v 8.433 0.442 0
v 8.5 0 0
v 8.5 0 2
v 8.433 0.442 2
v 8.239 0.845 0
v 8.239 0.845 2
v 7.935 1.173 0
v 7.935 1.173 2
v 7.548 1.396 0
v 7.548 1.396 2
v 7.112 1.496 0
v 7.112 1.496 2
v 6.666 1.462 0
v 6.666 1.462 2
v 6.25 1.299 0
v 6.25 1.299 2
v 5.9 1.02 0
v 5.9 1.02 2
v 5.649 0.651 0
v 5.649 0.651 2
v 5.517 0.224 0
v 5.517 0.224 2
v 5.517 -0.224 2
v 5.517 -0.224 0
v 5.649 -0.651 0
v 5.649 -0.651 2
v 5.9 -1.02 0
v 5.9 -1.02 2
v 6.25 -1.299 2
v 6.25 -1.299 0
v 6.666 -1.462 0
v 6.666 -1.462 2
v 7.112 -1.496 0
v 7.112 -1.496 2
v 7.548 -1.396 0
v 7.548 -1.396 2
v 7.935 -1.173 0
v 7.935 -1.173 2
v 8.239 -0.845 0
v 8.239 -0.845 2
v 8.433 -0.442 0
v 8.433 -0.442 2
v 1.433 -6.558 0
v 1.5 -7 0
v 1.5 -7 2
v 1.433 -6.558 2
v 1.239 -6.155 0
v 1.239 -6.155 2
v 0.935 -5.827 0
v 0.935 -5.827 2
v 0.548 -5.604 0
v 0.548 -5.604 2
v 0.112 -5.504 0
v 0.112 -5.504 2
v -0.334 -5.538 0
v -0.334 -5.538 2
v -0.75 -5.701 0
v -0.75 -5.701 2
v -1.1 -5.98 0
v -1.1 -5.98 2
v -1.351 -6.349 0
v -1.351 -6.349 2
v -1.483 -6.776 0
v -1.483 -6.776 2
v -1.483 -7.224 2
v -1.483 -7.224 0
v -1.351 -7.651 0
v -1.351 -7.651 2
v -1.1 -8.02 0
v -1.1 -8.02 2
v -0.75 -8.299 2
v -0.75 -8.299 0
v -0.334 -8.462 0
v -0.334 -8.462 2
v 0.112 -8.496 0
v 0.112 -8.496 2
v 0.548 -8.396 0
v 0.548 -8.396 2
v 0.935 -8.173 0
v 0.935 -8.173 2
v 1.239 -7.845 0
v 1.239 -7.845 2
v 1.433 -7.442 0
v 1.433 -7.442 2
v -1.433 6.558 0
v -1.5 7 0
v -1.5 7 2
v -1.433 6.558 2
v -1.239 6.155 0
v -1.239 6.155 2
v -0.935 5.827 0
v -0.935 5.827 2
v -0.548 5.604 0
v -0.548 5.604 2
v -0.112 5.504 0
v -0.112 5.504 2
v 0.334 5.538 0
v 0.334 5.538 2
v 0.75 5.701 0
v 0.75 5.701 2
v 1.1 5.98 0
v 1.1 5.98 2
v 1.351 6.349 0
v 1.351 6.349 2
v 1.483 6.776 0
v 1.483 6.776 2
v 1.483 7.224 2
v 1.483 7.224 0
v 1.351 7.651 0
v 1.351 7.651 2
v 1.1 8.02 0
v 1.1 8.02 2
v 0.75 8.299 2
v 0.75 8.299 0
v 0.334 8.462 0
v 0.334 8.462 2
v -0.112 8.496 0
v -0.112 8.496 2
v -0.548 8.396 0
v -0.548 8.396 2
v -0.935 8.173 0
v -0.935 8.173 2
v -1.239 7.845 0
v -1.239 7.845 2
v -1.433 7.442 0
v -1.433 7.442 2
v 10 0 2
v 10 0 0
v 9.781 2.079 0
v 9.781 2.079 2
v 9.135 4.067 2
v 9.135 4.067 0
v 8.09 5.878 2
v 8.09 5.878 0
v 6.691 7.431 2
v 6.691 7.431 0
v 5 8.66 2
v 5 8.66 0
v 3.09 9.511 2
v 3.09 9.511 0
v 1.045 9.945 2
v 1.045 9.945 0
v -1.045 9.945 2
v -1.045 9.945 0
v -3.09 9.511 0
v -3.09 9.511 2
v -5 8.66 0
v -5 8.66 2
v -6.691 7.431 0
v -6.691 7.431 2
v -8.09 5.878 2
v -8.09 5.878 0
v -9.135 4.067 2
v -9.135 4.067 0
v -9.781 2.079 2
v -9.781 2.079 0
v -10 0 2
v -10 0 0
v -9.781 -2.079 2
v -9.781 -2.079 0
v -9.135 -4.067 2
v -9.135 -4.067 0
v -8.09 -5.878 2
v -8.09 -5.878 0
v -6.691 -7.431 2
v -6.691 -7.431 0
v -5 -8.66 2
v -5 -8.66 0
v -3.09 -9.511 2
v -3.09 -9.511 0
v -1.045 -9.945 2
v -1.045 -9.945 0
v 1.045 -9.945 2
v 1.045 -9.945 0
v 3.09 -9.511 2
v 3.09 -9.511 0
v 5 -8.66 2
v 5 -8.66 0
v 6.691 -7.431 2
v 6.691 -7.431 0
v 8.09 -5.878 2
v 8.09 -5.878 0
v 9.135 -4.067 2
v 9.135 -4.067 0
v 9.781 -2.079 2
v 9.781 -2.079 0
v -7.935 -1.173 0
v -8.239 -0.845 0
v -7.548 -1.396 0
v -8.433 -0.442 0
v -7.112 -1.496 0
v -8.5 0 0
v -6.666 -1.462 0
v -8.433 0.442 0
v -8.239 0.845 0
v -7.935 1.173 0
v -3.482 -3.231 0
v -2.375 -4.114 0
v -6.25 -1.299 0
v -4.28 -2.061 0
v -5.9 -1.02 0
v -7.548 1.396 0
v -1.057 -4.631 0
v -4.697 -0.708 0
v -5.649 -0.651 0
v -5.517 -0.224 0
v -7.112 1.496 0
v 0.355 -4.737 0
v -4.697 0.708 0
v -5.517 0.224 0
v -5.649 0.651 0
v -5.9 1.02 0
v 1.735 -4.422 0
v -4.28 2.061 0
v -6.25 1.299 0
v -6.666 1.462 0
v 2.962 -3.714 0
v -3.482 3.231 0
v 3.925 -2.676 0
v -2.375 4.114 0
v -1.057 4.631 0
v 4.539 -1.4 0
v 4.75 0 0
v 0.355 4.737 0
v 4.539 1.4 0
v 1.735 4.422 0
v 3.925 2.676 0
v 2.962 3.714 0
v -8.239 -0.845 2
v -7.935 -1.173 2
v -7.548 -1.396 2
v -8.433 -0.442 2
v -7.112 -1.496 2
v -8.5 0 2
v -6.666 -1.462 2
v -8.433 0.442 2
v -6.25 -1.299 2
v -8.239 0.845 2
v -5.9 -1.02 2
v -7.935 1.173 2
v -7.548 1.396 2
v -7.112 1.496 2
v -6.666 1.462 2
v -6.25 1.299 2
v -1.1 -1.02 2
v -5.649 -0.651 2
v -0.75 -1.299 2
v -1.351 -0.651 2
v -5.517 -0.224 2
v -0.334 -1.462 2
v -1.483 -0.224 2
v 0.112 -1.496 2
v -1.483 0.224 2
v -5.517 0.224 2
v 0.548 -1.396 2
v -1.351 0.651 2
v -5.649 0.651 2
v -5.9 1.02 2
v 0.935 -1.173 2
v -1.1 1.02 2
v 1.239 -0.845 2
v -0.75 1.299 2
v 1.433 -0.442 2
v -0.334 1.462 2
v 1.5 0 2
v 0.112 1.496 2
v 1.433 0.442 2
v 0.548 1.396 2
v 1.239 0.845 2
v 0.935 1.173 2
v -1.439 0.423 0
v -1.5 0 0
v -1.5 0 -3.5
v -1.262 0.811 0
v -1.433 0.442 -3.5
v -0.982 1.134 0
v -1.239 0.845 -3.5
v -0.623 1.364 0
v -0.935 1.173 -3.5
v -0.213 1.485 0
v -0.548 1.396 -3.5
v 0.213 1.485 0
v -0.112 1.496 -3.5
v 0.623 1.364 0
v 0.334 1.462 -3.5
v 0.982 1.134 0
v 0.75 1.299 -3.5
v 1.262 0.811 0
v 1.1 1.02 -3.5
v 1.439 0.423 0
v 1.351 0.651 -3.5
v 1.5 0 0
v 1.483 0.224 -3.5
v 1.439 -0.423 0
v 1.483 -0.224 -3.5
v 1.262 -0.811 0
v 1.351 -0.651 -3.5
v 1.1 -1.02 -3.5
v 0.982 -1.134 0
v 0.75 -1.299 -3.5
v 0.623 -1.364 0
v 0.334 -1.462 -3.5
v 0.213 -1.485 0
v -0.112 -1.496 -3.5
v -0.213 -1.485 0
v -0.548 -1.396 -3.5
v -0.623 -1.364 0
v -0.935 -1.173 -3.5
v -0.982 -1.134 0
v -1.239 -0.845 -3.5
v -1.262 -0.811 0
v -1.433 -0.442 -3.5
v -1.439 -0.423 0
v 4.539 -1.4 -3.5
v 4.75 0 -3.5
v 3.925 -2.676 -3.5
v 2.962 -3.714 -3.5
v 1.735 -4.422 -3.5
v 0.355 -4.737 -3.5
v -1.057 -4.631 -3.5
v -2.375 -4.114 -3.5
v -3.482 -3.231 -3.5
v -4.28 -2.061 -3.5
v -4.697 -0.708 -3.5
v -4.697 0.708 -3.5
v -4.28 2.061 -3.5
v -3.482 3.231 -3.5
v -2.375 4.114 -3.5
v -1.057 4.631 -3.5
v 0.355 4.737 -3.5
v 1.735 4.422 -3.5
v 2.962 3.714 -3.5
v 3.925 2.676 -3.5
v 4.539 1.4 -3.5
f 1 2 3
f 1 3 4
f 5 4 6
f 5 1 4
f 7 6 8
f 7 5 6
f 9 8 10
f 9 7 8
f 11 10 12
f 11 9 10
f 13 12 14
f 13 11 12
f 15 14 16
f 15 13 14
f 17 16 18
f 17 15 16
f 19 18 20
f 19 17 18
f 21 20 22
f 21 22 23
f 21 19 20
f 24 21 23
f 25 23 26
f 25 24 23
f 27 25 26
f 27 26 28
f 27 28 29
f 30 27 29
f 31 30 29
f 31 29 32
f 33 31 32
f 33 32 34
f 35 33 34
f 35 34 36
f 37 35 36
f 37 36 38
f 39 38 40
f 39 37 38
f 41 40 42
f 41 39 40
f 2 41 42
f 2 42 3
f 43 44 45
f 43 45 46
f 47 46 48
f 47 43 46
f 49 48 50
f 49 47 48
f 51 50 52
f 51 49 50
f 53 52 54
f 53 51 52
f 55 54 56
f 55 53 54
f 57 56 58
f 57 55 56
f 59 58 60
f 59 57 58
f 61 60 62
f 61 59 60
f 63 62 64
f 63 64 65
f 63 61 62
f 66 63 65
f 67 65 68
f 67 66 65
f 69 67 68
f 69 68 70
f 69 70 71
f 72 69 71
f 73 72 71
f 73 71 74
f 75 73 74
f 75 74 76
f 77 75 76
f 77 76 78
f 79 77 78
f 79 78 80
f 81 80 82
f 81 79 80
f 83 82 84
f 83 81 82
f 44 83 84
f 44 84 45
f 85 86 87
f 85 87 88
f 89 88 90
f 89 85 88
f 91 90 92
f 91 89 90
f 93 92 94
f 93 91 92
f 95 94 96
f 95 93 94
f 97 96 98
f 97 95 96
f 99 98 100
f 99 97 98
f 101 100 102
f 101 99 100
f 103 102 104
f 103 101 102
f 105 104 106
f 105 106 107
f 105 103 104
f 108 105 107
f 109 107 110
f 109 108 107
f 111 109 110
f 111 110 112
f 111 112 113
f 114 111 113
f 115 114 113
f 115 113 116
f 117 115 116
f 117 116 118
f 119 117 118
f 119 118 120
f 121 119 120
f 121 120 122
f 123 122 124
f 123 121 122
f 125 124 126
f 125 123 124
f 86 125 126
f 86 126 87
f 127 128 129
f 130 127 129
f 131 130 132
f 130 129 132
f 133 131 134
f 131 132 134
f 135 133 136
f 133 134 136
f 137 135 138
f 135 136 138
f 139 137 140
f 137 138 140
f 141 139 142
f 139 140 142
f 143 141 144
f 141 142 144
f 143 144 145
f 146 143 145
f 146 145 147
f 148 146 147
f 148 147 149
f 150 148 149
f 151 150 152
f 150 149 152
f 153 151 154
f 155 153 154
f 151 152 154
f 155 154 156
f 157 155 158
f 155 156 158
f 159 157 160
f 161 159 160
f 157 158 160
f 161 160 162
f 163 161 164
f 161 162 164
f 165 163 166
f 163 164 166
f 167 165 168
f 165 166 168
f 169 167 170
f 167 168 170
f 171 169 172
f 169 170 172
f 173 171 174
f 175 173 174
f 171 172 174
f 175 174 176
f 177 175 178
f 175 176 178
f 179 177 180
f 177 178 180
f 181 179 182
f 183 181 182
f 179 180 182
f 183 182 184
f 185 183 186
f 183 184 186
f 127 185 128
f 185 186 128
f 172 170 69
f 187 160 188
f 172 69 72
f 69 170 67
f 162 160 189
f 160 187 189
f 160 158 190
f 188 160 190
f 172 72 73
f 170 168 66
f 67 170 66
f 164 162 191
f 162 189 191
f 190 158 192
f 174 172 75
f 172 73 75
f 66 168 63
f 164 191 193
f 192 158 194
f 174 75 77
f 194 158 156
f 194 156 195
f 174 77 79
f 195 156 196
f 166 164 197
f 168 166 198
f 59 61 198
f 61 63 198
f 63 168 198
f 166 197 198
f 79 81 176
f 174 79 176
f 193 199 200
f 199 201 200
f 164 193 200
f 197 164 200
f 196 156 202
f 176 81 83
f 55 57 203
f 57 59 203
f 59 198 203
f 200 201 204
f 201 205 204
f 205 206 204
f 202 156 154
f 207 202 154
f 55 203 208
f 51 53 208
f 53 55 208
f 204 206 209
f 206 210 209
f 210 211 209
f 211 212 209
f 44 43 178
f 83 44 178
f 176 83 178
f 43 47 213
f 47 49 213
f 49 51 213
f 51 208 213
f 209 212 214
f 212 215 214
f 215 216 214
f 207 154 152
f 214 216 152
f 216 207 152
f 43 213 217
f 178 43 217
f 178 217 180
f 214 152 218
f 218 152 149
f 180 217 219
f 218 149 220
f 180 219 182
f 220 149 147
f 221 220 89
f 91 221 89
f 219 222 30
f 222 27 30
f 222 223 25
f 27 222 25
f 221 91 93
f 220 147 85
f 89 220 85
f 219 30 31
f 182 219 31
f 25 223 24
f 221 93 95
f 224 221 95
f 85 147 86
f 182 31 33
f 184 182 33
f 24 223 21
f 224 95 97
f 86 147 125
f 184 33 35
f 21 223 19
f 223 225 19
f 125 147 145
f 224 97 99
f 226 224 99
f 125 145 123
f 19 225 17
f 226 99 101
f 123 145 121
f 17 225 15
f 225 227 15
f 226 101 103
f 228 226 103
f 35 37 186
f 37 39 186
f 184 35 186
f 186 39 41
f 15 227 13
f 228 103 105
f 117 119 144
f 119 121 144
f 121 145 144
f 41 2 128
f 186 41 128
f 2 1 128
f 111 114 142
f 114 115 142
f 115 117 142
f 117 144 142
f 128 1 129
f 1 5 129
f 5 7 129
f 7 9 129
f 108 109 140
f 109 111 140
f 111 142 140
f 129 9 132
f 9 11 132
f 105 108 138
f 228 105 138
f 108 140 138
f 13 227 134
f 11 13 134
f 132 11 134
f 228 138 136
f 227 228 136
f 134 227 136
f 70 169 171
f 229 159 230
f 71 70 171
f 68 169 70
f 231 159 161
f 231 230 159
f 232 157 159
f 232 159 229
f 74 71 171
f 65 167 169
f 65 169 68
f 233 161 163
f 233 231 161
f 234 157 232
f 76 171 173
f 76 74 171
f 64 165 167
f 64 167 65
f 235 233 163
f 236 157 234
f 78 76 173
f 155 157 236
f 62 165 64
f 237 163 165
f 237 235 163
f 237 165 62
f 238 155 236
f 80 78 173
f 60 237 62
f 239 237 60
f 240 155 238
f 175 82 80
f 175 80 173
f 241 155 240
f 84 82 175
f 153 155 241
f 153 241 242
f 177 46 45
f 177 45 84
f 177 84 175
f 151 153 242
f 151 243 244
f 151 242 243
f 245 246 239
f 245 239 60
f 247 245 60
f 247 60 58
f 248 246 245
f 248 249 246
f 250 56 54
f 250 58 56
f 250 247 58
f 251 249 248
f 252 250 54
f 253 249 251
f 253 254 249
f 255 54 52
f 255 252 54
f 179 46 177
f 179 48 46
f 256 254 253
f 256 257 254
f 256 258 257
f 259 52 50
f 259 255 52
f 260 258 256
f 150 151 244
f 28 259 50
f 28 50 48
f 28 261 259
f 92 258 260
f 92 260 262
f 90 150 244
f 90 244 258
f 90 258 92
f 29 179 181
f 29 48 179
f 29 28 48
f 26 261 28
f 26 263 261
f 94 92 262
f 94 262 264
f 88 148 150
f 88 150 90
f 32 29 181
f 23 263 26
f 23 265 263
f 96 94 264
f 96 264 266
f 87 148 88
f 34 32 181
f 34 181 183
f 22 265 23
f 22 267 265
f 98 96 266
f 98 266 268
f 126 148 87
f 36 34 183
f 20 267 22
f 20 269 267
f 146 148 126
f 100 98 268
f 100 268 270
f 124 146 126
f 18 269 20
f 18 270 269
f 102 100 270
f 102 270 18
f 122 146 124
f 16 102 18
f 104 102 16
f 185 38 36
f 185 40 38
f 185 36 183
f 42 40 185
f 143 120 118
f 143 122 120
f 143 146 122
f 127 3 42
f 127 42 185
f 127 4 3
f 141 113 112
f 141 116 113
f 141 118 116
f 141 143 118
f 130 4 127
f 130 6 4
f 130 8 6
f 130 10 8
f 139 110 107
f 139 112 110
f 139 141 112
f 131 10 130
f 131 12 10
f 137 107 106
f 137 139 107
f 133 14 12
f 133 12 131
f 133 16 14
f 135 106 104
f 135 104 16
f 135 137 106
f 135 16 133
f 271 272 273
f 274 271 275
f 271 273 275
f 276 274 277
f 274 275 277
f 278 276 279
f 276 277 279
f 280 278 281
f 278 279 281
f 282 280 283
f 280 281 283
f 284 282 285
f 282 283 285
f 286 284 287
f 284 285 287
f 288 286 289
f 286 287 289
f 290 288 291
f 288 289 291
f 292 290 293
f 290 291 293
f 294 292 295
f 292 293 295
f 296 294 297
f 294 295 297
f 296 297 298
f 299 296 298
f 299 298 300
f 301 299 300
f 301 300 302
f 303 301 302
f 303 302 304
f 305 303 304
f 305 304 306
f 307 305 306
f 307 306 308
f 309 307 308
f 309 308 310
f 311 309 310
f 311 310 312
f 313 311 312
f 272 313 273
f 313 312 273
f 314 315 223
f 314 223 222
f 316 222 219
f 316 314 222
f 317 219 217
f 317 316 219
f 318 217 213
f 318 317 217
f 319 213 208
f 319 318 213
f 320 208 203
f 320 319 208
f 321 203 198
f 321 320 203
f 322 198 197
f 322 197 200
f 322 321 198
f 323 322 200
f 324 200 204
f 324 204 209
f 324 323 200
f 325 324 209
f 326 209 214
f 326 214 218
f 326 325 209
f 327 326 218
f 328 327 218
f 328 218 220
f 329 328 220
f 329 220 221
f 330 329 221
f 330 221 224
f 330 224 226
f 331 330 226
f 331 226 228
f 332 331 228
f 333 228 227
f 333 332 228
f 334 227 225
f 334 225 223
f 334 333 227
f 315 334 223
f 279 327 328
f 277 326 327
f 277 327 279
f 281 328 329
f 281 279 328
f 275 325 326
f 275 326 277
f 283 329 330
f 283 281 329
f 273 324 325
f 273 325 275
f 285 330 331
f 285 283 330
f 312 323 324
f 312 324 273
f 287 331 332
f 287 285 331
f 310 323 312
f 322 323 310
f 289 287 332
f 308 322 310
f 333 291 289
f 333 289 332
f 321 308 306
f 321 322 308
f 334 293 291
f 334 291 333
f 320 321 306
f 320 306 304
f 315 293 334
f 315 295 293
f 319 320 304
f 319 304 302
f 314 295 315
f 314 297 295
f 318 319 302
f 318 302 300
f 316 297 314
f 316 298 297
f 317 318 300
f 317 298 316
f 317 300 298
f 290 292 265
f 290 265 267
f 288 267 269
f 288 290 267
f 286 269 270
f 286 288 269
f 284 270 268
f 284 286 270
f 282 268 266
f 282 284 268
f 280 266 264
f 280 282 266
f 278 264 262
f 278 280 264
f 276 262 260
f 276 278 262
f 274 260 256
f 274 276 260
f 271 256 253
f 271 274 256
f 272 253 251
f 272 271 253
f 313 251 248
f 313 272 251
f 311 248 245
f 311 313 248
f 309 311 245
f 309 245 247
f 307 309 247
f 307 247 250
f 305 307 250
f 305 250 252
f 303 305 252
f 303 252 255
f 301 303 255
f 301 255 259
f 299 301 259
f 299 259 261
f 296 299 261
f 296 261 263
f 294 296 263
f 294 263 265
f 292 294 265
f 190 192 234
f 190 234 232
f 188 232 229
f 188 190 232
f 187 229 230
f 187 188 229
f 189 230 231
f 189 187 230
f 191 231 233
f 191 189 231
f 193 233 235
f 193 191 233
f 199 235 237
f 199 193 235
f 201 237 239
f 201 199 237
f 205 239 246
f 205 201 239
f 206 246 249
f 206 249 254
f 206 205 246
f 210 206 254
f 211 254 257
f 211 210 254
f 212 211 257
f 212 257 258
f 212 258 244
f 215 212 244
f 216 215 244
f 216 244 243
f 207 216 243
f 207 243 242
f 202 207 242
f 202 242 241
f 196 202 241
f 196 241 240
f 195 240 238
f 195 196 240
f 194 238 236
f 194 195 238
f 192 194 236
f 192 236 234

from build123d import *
from build123d.topology import SkipClean

# Parameters (mm, degrees)
ESQUISSE1_R        = 10
ESQUISSE1_R_2      = 1.5
BOSS_EXTRU_1_DEPTH = 2
BOSS_EXTRU_2_START = 3.5
ESQUISSE2_R        = 4.75
ESQUISSE2_R_2      = 1.5
BOSS_EXTRU_2_DEPTH = 3.5


with BuildPart() as part:
    # Esquisse1 → Boss.-Extru.1 (new body)
    with BuildSketch(Plane.XY):
        Circle(ESQUISSE1_R)
        with Locations((7, 0)):
            Circle(ESQUISSE1_R_2, mode=Mode.SUBTRACT)
        with Locations(Location((0, 7, 0), (0, 0, 180))):
            Circle(ESQUISSE1_R_2, mode=Mode.SUBTRACT)
        Circle(ESQUISSE1_R_2, mode=Mode.SUBTRACT)
        with Locations((0, -7)):
            Circle(ESQUISSE1_R_2, mode=Mode.SUBTRACT)
        with Locations(Location((-7, 0, 0), (0, 0, 180))):
            Circle(ESQUISSE1_R_2, mode=Mode.SUBTRACT)
    extrude(amount=BOSS_EXTRU_1_DEPTH)

    # Esquisse2 → Boss.-Extru.2 (add)
    with SkipClean():  # the faces are left unmerged after this step: merging them gives an invalid solid
        with BuildSketch(Plane(origin=(0, 0, 0), x_dir=(-1, 0, 0), z_dir=(0, 0, -1)).offset(BOSS_EXTRU_2_START)):
            with Locations(Location((0, 0, 0), (0, 0, 180))):
                Circle(ESQUISSE2_R)
            Circle(ESQUISSE2_R_2, mode=Mode.SUBTRACT)
        extrude(amount=-BOSS_EXTRU_2_DEPTH)


solid = part.part
